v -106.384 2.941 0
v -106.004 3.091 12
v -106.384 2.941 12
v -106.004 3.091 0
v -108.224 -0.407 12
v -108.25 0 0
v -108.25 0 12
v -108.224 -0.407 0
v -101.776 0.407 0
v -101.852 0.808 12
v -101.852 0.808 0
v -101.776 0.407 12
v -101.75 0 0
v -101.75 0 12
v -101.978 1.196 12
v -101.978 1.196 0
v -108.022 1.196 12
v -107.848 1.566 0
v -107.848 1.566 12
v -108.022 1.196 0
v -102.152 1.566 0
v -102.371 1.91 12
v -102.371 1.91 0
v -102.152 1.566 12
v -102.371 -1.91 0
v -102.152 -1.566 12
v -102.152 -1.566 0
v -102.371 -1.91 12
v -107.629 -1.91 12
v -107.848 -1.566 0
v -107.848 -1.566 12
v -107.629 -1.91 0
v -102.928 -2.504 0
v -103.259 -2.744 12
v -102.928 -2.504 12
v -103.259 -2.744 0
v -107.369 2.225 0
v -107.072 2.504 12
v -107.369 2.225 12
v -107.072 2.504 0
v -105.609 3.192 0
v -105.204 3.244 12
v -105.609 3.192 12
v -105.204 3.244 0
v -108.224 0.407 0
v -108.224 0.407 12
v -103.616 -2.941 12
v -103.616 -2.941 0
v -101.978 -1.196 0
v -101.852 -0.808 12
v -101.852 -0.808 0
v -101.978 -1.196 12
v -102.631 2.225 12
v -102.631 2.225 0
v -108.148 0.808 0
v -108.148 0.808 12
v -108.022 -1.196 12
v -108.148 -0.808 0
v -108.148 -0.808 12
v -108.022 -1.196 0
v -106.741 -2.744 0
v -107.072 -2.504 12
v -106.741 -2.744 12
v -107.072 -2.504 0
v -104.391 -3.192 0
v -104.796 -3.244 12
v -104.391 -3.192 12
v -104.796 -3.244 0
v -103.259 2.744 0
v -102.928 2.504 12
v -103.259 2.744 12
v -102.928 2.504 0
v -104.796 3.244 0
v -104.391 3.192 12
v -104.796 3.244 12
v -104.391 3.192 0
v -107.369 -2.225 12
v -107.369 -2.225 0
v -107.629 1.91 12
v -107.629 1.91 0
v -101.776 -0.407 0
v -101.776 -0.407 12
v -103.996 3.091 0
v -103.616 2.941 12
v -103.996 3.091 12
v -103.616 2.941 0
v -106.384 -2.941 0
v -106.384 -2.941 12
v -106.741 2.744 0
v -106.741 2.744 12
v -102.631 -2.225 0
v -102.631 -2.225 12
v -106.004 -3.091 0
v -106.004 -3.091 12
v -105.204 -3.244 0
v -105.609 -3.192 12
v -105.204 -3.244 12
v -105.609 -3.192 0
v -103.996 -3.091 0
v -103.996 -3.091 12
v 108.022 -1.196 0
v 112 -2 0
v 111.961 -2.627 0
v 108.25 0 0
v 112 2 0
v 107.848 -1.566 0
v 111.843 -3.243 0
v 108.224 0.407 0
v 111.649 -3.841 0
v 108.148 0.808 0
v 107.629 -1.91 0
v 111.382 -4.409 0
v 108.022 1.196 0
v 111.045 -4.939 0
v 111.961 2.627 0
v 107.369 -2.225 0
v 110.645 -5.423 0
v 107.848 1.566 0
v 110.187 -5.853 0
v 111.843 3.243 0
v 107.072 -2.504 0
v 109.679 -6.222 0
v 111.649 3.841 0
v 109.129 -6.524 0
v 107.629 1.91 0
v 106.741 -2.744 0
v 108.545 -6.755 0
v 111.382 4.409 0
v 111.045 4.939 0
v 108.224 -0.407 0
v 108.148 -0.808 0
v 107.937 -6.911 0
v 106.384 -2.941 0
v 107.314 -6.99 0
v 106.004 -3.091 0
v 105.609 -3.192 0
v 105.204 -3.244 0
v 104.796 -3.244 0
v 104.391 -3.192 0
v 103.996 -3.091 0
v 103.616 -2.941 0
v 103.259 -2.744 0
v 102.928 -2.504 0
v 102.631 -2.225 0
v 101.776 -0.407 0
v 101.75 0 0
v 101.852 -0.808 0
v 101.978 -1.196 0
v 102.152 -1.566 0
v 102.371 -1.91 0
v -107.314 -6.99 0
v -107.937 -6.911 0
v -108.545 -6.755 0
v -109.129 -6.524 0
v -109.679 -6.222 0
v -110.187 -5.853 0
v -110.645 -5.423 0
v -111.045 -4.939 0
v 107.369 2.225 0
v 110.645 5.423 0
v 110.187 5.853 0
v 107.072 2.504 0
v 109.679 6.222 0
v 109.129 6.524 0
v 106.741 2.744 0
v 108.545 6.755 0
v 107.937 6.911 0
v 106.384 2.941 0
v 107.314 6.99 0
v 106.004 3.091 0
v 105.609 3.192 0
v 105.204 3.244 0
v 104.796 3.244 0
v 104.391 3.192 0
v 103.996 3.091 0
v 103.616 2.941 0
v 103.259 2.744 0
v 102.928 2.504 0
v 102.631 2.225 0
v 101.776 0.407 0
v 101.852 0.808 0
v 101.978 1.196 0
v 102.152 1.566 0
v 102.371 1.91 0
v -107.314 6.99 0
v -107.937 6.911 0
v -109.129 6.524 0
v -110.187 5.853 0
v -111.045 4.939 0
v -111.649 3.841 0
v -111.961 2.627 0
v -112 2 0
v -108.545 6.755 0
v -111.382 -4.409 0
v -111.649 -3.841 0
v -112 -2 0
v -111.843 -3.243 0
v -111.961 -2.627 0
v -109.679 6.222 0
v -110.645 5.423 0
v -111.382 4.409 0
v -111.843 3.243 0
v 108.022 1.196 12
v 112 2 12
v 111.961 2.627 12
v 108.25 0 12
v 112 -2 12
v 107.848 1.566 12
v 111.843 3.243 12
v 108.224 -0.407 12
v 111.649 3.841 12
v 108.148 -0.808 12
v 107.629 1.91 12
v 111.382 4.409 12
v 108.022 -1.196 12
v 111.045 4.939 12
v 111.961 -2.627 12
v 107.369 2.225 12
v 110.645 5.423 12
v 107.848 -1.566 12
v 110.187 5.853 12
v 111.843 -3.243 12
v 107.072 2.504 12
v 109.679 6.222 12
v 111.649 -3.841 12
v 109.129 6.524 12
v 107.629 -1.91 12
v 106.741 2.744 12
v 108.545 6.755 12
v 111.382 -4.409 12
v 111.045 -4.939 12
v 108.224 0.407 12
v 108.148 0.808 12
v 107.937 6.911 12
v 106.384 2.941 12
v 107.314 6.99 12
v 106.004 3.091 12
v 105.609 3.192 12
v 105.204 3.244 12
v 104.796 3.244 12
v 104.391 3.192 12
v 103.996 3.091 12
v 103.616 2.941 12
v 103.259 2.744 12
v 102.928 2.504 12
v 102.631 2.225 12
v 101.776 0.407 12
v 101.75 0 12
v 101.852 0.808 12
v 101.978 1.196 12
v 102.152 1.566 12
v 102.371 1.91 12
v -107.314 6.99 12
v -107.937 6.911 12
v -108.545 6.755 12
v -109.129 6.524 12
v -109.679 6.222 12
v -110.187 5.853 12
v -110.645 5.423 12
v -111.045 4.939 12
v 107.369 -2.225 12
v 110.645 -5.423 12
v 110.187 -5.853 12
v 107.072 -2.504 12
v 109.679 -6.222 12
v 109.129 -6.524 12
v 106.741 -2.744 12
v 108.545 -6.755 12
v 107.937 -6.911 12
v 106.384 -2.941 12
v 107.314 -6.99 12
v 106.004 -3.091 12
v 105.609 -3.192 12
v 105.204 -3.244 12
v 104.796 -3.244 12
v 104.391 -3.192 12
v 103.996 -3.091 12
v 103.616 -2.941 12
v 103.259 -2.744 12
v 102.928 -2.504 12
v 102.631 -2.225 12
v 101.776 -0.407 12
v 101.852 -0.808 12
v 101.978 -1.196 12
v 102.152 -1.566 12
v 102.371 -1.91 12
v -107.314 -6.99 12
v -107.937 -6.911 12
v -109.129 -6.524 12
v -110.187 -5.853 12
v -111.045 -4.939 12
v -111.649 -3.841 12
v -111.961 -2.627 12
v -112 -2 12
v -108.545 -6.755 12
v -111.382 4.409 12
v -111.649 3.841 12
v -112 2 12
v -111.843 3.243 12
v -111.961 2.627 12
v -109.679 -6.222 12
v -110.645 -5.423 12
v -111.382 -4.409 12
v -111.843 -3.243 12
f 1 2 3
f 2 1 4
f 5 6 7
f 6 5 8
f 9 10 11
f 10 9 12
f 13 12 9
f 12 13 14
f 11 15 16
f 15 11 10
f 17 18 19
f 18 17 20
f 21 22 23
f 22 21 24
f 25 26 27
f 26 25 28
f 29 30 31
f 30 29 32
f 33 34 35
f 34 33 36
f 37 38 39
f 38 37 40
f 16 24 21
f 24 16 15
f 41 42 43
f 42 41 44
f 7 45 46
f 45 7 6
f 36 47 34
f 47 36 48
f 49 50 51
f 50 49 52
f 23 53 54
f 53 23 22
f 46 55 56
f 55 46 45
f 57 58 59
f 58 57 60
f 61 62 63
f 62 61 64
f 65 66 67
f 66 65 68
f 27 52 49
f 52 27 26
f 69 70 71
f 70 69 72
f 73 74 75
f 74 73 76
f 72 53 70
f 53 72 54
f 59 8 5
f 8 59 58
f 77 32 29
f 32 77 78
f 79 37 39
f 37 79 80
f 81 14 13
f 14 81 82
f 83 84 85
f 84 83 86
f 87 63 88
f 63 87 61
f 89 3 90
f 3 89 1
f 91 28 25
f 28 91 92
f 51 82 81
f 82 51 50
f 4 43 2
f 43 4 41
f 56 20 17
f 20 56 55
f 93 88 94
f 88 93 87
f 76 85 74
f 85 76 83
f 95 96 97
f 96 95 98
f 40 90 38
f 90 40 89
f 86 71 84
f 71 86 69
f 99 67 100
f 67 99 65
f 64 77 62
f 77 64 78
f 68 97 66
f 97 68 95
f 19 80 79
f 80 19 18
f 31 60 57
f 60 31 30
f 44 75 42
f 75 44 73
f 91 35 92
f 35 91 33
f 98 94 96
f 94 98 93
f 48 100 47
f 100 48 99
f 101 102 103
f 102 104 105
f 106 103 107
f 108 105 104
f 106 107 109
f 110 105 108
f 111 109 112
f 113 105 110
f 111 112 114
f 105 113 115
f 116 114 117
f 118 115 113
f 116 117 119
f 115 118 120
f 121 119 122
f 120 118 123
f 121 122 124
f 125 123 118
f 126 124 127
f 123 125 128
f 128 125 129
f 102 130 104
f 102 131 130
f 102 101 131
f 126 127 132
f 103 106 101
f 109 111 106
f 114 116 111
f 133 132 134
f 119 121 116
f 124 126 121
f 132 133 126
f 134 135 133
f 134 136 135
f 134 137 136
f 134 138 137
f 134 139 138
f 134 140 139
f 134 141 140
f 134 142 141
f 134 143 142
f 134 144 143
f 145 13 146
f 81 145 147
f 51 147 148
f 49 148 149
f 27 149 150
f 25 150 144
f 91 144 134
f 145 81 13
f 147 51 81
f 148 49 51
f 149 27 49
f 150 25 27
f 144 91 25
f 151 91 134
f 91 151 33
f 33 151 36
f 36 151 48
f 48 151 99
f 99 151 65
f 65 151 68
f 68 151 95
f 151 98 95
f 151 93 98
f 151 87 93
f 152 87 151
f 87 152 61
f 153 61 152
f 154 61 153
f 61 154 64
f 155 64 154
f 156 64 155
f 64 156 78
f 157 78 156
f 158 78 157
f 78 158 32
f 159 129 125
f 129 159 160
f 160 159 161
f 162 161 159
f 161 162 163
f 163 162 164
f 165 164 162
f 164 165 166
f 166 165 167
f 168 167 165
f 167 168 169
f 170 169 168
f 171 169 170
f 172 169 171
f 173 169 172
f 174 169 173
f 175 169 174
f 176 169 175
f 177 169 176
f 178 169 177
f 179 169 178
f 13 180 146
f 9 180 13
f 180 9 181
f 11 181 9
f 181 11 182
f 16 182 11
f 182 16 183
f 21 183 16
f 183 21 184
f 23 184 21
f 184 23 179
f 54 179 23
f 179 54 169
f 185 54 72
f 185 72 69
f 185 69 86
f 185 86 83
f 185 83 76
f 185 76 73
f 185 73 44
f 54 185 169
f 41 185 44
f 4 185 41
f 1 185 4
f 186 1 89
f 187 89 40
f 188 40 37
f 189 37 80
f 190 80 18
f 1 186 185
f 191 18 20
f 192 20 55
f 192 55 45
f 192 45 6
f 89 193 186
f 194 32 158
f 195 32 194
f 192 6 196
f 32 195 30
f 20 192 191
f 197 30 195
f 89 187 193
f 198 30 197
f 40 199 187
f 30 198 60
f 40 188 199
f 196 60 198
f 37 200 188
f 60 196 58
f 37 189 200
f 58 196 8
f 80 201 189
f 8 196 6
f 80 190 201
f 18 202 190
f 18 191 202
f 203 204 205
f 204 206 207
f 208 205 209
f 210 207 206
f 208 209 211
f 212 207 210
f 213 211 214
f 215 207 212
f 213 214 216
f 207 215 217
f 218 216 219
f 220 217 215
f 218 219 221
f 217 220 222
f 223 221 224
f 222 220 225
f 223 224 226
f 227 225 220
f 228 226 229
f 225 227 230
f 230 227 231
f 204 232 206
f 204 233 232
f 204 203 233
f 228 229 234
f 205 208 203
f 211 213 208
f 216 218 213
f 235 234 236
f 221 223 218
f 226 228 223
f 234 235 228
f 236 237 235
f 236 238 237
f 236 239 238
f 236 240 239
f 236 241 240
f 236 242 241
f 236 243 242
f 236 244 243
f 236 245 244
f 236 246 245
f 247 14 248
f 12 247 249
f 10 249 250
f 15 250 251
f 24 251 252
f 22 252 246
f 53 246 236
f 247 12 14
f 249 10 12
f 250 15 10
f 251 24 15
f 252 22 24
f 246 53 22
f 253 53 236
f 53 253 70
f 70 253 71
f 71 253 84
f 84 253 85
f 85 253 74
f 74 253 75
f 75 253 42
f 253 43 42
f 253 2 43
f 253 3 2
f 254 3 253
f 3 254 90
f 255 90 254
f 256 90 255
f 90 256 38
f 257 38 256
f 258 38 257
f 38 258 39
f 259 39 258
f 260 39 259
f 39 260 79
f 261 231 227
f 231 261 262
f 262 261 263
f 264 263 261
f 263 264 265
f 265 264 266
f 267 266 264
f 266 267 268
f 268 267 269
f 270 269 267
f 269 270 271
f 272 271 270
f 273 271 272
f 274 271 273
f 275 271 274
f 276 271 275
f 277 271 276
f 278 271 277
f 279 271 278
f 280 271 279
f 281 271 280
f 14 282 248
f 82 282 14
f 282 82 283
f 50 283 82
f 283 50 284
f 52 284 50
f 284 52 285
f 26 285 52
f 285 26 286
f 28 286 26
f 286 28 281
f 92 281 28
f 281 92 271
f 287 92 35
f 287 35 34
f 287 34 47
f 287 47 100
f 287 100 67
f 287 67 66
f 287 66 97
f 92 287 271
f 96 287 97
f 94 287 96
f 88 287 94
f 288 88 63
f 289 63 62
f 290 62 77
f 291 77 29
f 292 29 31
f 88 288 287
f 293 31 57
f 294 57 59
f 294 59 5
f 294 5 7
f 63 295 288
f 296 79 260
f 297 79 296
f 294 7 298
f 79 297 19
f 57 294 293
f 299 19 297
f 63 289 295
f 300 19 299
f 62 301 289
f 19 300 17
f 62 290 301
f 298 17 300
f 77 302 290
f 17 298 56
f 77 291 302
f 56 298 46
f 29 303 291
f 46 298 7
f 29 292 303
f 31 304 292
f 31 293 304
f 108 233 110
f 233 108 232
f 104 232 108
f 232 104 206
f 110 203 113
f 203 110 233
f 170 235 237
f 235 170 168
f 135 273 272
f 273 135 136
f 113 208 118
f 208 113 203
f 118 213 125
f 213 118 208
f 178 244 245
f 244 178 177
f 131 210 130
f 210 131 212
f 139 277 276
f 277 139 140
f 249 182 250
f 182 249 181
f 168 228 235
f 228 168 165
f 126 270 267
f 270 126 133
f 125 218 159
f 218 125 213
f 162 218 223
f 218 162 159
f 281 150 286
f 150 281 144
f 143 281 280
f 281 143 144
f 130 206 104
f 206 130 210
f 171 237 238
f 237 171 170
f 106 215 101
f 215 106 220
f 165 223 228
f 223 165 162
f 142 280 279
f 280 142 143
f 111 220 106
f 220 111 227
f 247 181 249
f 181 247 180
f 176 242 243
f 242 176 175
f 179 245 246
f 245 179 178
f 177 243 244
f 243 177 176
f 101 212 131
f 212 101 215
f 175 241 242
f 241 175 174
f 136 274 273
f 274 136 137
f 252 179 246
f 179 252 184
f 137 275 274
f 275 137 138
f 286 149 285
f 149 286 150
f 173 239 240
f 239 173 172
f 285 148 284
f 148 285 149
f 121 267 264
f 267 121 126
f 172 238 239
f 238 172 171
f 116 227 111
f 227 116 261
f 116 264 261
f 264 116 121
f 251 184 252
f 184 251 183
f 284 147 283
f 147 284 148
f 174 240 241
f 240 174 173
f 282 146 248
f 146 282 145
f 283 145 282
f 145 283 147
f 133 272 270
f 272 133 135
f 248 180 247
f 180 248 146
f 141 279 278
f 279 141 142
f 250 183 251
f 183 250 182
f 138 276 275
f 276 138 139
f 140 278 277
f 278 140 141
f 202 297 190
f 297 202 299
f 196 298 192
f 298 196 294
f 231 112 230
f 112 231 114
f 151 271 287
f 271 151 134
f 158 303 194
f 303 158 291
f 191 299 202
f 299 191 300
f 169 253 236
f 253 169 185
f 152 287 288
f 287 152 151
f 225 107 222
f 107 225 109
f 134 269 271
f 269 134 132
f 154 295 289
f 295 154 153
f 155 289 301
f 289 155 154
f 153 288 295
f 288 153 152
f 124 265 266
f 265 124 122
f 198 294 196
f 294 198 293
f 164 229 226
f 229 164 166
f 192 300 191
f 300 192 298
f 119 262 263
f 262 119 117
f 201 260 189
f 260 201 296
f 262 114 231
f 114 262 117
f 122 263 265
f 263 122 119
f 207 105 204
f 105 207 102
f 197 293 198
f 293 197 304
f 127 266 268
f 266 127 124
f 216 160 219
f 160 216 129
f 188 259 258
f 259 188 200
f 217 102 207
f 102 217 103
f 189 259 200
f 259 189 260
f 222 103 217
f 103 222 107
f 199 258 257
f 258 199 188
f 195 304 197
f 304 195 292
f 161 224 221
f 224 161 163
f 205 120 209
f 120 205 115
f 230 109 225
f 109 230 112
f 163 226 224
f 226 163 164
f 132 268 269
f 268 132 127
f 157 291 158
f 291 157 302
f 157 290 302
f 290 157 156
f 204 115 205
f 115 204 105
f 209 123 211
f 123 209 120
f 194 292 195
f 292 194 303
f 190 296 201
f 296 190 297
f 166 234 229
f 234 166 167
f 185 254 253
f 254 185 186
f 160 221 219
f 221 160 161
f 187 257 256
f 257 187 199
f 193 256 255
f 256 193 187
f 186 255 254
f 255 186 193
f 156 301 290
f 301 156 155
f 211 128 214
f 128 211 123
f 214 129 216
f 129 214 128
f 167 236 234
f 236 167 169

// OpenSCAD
$fn = 50;


difference() {
	union() {
		hull() {
			translate(v = [-107.0000000000, 2.0000000000, 0]) {
				cylinder(h = 12, r = 5);
			}
			translate(v = [107.0000000000, 2.0000000000, 0]) {
				cylinder(h = 12, r = 5);
			}
			translate(v = [-107.0000000000, -2.0000000000, 0]) {
				cylinder(h = 12, r = 5);
			}
			translate(v = [107.0000000000, -2.0000000000, 0]) {
				cylinder(h = 12, r = 5);
			}
		}
	}
	union() {
		translate(v = [-105.0000000000, 0.0000000000, 0]) {
			cylinder(h = 12, r = 3.2500000000);
		}
		translate(v = [105.0000000000, 0.0000000000, 0]) {
			cylinder(h = 12, r = 3.2500000000);
		}
		translate(v = [-105.0000000000, 0.0000000000, 0]) {
			cylinder(h = 12, r = 1.8000000000);
		}
		translate(v = [105.0000000000, 0.0000000000, 0]) {
			cylinder(h = 12, r = 1.8000000000);
		}
		translate(v = [-105.0000000000, 0.0000000000, 0]) {
			cylinder(h = 12, r = 1.8000000000);
		}
		translate(v = [105.0000000000, 0.0000000000, 0]) {
			cylinder(h = 12, r = 1.8000000000);
		}
		translate(v = [-105.0000000000, 0.0000000000, 0]) {
			cylinder(h = 12, r = 1.8000000000);
		}
		translate(v = [105.0000000000, 0.0000000000, 0]) {
			cylinder(h = 12, r = 1.8000000000);
		}
	}
}
